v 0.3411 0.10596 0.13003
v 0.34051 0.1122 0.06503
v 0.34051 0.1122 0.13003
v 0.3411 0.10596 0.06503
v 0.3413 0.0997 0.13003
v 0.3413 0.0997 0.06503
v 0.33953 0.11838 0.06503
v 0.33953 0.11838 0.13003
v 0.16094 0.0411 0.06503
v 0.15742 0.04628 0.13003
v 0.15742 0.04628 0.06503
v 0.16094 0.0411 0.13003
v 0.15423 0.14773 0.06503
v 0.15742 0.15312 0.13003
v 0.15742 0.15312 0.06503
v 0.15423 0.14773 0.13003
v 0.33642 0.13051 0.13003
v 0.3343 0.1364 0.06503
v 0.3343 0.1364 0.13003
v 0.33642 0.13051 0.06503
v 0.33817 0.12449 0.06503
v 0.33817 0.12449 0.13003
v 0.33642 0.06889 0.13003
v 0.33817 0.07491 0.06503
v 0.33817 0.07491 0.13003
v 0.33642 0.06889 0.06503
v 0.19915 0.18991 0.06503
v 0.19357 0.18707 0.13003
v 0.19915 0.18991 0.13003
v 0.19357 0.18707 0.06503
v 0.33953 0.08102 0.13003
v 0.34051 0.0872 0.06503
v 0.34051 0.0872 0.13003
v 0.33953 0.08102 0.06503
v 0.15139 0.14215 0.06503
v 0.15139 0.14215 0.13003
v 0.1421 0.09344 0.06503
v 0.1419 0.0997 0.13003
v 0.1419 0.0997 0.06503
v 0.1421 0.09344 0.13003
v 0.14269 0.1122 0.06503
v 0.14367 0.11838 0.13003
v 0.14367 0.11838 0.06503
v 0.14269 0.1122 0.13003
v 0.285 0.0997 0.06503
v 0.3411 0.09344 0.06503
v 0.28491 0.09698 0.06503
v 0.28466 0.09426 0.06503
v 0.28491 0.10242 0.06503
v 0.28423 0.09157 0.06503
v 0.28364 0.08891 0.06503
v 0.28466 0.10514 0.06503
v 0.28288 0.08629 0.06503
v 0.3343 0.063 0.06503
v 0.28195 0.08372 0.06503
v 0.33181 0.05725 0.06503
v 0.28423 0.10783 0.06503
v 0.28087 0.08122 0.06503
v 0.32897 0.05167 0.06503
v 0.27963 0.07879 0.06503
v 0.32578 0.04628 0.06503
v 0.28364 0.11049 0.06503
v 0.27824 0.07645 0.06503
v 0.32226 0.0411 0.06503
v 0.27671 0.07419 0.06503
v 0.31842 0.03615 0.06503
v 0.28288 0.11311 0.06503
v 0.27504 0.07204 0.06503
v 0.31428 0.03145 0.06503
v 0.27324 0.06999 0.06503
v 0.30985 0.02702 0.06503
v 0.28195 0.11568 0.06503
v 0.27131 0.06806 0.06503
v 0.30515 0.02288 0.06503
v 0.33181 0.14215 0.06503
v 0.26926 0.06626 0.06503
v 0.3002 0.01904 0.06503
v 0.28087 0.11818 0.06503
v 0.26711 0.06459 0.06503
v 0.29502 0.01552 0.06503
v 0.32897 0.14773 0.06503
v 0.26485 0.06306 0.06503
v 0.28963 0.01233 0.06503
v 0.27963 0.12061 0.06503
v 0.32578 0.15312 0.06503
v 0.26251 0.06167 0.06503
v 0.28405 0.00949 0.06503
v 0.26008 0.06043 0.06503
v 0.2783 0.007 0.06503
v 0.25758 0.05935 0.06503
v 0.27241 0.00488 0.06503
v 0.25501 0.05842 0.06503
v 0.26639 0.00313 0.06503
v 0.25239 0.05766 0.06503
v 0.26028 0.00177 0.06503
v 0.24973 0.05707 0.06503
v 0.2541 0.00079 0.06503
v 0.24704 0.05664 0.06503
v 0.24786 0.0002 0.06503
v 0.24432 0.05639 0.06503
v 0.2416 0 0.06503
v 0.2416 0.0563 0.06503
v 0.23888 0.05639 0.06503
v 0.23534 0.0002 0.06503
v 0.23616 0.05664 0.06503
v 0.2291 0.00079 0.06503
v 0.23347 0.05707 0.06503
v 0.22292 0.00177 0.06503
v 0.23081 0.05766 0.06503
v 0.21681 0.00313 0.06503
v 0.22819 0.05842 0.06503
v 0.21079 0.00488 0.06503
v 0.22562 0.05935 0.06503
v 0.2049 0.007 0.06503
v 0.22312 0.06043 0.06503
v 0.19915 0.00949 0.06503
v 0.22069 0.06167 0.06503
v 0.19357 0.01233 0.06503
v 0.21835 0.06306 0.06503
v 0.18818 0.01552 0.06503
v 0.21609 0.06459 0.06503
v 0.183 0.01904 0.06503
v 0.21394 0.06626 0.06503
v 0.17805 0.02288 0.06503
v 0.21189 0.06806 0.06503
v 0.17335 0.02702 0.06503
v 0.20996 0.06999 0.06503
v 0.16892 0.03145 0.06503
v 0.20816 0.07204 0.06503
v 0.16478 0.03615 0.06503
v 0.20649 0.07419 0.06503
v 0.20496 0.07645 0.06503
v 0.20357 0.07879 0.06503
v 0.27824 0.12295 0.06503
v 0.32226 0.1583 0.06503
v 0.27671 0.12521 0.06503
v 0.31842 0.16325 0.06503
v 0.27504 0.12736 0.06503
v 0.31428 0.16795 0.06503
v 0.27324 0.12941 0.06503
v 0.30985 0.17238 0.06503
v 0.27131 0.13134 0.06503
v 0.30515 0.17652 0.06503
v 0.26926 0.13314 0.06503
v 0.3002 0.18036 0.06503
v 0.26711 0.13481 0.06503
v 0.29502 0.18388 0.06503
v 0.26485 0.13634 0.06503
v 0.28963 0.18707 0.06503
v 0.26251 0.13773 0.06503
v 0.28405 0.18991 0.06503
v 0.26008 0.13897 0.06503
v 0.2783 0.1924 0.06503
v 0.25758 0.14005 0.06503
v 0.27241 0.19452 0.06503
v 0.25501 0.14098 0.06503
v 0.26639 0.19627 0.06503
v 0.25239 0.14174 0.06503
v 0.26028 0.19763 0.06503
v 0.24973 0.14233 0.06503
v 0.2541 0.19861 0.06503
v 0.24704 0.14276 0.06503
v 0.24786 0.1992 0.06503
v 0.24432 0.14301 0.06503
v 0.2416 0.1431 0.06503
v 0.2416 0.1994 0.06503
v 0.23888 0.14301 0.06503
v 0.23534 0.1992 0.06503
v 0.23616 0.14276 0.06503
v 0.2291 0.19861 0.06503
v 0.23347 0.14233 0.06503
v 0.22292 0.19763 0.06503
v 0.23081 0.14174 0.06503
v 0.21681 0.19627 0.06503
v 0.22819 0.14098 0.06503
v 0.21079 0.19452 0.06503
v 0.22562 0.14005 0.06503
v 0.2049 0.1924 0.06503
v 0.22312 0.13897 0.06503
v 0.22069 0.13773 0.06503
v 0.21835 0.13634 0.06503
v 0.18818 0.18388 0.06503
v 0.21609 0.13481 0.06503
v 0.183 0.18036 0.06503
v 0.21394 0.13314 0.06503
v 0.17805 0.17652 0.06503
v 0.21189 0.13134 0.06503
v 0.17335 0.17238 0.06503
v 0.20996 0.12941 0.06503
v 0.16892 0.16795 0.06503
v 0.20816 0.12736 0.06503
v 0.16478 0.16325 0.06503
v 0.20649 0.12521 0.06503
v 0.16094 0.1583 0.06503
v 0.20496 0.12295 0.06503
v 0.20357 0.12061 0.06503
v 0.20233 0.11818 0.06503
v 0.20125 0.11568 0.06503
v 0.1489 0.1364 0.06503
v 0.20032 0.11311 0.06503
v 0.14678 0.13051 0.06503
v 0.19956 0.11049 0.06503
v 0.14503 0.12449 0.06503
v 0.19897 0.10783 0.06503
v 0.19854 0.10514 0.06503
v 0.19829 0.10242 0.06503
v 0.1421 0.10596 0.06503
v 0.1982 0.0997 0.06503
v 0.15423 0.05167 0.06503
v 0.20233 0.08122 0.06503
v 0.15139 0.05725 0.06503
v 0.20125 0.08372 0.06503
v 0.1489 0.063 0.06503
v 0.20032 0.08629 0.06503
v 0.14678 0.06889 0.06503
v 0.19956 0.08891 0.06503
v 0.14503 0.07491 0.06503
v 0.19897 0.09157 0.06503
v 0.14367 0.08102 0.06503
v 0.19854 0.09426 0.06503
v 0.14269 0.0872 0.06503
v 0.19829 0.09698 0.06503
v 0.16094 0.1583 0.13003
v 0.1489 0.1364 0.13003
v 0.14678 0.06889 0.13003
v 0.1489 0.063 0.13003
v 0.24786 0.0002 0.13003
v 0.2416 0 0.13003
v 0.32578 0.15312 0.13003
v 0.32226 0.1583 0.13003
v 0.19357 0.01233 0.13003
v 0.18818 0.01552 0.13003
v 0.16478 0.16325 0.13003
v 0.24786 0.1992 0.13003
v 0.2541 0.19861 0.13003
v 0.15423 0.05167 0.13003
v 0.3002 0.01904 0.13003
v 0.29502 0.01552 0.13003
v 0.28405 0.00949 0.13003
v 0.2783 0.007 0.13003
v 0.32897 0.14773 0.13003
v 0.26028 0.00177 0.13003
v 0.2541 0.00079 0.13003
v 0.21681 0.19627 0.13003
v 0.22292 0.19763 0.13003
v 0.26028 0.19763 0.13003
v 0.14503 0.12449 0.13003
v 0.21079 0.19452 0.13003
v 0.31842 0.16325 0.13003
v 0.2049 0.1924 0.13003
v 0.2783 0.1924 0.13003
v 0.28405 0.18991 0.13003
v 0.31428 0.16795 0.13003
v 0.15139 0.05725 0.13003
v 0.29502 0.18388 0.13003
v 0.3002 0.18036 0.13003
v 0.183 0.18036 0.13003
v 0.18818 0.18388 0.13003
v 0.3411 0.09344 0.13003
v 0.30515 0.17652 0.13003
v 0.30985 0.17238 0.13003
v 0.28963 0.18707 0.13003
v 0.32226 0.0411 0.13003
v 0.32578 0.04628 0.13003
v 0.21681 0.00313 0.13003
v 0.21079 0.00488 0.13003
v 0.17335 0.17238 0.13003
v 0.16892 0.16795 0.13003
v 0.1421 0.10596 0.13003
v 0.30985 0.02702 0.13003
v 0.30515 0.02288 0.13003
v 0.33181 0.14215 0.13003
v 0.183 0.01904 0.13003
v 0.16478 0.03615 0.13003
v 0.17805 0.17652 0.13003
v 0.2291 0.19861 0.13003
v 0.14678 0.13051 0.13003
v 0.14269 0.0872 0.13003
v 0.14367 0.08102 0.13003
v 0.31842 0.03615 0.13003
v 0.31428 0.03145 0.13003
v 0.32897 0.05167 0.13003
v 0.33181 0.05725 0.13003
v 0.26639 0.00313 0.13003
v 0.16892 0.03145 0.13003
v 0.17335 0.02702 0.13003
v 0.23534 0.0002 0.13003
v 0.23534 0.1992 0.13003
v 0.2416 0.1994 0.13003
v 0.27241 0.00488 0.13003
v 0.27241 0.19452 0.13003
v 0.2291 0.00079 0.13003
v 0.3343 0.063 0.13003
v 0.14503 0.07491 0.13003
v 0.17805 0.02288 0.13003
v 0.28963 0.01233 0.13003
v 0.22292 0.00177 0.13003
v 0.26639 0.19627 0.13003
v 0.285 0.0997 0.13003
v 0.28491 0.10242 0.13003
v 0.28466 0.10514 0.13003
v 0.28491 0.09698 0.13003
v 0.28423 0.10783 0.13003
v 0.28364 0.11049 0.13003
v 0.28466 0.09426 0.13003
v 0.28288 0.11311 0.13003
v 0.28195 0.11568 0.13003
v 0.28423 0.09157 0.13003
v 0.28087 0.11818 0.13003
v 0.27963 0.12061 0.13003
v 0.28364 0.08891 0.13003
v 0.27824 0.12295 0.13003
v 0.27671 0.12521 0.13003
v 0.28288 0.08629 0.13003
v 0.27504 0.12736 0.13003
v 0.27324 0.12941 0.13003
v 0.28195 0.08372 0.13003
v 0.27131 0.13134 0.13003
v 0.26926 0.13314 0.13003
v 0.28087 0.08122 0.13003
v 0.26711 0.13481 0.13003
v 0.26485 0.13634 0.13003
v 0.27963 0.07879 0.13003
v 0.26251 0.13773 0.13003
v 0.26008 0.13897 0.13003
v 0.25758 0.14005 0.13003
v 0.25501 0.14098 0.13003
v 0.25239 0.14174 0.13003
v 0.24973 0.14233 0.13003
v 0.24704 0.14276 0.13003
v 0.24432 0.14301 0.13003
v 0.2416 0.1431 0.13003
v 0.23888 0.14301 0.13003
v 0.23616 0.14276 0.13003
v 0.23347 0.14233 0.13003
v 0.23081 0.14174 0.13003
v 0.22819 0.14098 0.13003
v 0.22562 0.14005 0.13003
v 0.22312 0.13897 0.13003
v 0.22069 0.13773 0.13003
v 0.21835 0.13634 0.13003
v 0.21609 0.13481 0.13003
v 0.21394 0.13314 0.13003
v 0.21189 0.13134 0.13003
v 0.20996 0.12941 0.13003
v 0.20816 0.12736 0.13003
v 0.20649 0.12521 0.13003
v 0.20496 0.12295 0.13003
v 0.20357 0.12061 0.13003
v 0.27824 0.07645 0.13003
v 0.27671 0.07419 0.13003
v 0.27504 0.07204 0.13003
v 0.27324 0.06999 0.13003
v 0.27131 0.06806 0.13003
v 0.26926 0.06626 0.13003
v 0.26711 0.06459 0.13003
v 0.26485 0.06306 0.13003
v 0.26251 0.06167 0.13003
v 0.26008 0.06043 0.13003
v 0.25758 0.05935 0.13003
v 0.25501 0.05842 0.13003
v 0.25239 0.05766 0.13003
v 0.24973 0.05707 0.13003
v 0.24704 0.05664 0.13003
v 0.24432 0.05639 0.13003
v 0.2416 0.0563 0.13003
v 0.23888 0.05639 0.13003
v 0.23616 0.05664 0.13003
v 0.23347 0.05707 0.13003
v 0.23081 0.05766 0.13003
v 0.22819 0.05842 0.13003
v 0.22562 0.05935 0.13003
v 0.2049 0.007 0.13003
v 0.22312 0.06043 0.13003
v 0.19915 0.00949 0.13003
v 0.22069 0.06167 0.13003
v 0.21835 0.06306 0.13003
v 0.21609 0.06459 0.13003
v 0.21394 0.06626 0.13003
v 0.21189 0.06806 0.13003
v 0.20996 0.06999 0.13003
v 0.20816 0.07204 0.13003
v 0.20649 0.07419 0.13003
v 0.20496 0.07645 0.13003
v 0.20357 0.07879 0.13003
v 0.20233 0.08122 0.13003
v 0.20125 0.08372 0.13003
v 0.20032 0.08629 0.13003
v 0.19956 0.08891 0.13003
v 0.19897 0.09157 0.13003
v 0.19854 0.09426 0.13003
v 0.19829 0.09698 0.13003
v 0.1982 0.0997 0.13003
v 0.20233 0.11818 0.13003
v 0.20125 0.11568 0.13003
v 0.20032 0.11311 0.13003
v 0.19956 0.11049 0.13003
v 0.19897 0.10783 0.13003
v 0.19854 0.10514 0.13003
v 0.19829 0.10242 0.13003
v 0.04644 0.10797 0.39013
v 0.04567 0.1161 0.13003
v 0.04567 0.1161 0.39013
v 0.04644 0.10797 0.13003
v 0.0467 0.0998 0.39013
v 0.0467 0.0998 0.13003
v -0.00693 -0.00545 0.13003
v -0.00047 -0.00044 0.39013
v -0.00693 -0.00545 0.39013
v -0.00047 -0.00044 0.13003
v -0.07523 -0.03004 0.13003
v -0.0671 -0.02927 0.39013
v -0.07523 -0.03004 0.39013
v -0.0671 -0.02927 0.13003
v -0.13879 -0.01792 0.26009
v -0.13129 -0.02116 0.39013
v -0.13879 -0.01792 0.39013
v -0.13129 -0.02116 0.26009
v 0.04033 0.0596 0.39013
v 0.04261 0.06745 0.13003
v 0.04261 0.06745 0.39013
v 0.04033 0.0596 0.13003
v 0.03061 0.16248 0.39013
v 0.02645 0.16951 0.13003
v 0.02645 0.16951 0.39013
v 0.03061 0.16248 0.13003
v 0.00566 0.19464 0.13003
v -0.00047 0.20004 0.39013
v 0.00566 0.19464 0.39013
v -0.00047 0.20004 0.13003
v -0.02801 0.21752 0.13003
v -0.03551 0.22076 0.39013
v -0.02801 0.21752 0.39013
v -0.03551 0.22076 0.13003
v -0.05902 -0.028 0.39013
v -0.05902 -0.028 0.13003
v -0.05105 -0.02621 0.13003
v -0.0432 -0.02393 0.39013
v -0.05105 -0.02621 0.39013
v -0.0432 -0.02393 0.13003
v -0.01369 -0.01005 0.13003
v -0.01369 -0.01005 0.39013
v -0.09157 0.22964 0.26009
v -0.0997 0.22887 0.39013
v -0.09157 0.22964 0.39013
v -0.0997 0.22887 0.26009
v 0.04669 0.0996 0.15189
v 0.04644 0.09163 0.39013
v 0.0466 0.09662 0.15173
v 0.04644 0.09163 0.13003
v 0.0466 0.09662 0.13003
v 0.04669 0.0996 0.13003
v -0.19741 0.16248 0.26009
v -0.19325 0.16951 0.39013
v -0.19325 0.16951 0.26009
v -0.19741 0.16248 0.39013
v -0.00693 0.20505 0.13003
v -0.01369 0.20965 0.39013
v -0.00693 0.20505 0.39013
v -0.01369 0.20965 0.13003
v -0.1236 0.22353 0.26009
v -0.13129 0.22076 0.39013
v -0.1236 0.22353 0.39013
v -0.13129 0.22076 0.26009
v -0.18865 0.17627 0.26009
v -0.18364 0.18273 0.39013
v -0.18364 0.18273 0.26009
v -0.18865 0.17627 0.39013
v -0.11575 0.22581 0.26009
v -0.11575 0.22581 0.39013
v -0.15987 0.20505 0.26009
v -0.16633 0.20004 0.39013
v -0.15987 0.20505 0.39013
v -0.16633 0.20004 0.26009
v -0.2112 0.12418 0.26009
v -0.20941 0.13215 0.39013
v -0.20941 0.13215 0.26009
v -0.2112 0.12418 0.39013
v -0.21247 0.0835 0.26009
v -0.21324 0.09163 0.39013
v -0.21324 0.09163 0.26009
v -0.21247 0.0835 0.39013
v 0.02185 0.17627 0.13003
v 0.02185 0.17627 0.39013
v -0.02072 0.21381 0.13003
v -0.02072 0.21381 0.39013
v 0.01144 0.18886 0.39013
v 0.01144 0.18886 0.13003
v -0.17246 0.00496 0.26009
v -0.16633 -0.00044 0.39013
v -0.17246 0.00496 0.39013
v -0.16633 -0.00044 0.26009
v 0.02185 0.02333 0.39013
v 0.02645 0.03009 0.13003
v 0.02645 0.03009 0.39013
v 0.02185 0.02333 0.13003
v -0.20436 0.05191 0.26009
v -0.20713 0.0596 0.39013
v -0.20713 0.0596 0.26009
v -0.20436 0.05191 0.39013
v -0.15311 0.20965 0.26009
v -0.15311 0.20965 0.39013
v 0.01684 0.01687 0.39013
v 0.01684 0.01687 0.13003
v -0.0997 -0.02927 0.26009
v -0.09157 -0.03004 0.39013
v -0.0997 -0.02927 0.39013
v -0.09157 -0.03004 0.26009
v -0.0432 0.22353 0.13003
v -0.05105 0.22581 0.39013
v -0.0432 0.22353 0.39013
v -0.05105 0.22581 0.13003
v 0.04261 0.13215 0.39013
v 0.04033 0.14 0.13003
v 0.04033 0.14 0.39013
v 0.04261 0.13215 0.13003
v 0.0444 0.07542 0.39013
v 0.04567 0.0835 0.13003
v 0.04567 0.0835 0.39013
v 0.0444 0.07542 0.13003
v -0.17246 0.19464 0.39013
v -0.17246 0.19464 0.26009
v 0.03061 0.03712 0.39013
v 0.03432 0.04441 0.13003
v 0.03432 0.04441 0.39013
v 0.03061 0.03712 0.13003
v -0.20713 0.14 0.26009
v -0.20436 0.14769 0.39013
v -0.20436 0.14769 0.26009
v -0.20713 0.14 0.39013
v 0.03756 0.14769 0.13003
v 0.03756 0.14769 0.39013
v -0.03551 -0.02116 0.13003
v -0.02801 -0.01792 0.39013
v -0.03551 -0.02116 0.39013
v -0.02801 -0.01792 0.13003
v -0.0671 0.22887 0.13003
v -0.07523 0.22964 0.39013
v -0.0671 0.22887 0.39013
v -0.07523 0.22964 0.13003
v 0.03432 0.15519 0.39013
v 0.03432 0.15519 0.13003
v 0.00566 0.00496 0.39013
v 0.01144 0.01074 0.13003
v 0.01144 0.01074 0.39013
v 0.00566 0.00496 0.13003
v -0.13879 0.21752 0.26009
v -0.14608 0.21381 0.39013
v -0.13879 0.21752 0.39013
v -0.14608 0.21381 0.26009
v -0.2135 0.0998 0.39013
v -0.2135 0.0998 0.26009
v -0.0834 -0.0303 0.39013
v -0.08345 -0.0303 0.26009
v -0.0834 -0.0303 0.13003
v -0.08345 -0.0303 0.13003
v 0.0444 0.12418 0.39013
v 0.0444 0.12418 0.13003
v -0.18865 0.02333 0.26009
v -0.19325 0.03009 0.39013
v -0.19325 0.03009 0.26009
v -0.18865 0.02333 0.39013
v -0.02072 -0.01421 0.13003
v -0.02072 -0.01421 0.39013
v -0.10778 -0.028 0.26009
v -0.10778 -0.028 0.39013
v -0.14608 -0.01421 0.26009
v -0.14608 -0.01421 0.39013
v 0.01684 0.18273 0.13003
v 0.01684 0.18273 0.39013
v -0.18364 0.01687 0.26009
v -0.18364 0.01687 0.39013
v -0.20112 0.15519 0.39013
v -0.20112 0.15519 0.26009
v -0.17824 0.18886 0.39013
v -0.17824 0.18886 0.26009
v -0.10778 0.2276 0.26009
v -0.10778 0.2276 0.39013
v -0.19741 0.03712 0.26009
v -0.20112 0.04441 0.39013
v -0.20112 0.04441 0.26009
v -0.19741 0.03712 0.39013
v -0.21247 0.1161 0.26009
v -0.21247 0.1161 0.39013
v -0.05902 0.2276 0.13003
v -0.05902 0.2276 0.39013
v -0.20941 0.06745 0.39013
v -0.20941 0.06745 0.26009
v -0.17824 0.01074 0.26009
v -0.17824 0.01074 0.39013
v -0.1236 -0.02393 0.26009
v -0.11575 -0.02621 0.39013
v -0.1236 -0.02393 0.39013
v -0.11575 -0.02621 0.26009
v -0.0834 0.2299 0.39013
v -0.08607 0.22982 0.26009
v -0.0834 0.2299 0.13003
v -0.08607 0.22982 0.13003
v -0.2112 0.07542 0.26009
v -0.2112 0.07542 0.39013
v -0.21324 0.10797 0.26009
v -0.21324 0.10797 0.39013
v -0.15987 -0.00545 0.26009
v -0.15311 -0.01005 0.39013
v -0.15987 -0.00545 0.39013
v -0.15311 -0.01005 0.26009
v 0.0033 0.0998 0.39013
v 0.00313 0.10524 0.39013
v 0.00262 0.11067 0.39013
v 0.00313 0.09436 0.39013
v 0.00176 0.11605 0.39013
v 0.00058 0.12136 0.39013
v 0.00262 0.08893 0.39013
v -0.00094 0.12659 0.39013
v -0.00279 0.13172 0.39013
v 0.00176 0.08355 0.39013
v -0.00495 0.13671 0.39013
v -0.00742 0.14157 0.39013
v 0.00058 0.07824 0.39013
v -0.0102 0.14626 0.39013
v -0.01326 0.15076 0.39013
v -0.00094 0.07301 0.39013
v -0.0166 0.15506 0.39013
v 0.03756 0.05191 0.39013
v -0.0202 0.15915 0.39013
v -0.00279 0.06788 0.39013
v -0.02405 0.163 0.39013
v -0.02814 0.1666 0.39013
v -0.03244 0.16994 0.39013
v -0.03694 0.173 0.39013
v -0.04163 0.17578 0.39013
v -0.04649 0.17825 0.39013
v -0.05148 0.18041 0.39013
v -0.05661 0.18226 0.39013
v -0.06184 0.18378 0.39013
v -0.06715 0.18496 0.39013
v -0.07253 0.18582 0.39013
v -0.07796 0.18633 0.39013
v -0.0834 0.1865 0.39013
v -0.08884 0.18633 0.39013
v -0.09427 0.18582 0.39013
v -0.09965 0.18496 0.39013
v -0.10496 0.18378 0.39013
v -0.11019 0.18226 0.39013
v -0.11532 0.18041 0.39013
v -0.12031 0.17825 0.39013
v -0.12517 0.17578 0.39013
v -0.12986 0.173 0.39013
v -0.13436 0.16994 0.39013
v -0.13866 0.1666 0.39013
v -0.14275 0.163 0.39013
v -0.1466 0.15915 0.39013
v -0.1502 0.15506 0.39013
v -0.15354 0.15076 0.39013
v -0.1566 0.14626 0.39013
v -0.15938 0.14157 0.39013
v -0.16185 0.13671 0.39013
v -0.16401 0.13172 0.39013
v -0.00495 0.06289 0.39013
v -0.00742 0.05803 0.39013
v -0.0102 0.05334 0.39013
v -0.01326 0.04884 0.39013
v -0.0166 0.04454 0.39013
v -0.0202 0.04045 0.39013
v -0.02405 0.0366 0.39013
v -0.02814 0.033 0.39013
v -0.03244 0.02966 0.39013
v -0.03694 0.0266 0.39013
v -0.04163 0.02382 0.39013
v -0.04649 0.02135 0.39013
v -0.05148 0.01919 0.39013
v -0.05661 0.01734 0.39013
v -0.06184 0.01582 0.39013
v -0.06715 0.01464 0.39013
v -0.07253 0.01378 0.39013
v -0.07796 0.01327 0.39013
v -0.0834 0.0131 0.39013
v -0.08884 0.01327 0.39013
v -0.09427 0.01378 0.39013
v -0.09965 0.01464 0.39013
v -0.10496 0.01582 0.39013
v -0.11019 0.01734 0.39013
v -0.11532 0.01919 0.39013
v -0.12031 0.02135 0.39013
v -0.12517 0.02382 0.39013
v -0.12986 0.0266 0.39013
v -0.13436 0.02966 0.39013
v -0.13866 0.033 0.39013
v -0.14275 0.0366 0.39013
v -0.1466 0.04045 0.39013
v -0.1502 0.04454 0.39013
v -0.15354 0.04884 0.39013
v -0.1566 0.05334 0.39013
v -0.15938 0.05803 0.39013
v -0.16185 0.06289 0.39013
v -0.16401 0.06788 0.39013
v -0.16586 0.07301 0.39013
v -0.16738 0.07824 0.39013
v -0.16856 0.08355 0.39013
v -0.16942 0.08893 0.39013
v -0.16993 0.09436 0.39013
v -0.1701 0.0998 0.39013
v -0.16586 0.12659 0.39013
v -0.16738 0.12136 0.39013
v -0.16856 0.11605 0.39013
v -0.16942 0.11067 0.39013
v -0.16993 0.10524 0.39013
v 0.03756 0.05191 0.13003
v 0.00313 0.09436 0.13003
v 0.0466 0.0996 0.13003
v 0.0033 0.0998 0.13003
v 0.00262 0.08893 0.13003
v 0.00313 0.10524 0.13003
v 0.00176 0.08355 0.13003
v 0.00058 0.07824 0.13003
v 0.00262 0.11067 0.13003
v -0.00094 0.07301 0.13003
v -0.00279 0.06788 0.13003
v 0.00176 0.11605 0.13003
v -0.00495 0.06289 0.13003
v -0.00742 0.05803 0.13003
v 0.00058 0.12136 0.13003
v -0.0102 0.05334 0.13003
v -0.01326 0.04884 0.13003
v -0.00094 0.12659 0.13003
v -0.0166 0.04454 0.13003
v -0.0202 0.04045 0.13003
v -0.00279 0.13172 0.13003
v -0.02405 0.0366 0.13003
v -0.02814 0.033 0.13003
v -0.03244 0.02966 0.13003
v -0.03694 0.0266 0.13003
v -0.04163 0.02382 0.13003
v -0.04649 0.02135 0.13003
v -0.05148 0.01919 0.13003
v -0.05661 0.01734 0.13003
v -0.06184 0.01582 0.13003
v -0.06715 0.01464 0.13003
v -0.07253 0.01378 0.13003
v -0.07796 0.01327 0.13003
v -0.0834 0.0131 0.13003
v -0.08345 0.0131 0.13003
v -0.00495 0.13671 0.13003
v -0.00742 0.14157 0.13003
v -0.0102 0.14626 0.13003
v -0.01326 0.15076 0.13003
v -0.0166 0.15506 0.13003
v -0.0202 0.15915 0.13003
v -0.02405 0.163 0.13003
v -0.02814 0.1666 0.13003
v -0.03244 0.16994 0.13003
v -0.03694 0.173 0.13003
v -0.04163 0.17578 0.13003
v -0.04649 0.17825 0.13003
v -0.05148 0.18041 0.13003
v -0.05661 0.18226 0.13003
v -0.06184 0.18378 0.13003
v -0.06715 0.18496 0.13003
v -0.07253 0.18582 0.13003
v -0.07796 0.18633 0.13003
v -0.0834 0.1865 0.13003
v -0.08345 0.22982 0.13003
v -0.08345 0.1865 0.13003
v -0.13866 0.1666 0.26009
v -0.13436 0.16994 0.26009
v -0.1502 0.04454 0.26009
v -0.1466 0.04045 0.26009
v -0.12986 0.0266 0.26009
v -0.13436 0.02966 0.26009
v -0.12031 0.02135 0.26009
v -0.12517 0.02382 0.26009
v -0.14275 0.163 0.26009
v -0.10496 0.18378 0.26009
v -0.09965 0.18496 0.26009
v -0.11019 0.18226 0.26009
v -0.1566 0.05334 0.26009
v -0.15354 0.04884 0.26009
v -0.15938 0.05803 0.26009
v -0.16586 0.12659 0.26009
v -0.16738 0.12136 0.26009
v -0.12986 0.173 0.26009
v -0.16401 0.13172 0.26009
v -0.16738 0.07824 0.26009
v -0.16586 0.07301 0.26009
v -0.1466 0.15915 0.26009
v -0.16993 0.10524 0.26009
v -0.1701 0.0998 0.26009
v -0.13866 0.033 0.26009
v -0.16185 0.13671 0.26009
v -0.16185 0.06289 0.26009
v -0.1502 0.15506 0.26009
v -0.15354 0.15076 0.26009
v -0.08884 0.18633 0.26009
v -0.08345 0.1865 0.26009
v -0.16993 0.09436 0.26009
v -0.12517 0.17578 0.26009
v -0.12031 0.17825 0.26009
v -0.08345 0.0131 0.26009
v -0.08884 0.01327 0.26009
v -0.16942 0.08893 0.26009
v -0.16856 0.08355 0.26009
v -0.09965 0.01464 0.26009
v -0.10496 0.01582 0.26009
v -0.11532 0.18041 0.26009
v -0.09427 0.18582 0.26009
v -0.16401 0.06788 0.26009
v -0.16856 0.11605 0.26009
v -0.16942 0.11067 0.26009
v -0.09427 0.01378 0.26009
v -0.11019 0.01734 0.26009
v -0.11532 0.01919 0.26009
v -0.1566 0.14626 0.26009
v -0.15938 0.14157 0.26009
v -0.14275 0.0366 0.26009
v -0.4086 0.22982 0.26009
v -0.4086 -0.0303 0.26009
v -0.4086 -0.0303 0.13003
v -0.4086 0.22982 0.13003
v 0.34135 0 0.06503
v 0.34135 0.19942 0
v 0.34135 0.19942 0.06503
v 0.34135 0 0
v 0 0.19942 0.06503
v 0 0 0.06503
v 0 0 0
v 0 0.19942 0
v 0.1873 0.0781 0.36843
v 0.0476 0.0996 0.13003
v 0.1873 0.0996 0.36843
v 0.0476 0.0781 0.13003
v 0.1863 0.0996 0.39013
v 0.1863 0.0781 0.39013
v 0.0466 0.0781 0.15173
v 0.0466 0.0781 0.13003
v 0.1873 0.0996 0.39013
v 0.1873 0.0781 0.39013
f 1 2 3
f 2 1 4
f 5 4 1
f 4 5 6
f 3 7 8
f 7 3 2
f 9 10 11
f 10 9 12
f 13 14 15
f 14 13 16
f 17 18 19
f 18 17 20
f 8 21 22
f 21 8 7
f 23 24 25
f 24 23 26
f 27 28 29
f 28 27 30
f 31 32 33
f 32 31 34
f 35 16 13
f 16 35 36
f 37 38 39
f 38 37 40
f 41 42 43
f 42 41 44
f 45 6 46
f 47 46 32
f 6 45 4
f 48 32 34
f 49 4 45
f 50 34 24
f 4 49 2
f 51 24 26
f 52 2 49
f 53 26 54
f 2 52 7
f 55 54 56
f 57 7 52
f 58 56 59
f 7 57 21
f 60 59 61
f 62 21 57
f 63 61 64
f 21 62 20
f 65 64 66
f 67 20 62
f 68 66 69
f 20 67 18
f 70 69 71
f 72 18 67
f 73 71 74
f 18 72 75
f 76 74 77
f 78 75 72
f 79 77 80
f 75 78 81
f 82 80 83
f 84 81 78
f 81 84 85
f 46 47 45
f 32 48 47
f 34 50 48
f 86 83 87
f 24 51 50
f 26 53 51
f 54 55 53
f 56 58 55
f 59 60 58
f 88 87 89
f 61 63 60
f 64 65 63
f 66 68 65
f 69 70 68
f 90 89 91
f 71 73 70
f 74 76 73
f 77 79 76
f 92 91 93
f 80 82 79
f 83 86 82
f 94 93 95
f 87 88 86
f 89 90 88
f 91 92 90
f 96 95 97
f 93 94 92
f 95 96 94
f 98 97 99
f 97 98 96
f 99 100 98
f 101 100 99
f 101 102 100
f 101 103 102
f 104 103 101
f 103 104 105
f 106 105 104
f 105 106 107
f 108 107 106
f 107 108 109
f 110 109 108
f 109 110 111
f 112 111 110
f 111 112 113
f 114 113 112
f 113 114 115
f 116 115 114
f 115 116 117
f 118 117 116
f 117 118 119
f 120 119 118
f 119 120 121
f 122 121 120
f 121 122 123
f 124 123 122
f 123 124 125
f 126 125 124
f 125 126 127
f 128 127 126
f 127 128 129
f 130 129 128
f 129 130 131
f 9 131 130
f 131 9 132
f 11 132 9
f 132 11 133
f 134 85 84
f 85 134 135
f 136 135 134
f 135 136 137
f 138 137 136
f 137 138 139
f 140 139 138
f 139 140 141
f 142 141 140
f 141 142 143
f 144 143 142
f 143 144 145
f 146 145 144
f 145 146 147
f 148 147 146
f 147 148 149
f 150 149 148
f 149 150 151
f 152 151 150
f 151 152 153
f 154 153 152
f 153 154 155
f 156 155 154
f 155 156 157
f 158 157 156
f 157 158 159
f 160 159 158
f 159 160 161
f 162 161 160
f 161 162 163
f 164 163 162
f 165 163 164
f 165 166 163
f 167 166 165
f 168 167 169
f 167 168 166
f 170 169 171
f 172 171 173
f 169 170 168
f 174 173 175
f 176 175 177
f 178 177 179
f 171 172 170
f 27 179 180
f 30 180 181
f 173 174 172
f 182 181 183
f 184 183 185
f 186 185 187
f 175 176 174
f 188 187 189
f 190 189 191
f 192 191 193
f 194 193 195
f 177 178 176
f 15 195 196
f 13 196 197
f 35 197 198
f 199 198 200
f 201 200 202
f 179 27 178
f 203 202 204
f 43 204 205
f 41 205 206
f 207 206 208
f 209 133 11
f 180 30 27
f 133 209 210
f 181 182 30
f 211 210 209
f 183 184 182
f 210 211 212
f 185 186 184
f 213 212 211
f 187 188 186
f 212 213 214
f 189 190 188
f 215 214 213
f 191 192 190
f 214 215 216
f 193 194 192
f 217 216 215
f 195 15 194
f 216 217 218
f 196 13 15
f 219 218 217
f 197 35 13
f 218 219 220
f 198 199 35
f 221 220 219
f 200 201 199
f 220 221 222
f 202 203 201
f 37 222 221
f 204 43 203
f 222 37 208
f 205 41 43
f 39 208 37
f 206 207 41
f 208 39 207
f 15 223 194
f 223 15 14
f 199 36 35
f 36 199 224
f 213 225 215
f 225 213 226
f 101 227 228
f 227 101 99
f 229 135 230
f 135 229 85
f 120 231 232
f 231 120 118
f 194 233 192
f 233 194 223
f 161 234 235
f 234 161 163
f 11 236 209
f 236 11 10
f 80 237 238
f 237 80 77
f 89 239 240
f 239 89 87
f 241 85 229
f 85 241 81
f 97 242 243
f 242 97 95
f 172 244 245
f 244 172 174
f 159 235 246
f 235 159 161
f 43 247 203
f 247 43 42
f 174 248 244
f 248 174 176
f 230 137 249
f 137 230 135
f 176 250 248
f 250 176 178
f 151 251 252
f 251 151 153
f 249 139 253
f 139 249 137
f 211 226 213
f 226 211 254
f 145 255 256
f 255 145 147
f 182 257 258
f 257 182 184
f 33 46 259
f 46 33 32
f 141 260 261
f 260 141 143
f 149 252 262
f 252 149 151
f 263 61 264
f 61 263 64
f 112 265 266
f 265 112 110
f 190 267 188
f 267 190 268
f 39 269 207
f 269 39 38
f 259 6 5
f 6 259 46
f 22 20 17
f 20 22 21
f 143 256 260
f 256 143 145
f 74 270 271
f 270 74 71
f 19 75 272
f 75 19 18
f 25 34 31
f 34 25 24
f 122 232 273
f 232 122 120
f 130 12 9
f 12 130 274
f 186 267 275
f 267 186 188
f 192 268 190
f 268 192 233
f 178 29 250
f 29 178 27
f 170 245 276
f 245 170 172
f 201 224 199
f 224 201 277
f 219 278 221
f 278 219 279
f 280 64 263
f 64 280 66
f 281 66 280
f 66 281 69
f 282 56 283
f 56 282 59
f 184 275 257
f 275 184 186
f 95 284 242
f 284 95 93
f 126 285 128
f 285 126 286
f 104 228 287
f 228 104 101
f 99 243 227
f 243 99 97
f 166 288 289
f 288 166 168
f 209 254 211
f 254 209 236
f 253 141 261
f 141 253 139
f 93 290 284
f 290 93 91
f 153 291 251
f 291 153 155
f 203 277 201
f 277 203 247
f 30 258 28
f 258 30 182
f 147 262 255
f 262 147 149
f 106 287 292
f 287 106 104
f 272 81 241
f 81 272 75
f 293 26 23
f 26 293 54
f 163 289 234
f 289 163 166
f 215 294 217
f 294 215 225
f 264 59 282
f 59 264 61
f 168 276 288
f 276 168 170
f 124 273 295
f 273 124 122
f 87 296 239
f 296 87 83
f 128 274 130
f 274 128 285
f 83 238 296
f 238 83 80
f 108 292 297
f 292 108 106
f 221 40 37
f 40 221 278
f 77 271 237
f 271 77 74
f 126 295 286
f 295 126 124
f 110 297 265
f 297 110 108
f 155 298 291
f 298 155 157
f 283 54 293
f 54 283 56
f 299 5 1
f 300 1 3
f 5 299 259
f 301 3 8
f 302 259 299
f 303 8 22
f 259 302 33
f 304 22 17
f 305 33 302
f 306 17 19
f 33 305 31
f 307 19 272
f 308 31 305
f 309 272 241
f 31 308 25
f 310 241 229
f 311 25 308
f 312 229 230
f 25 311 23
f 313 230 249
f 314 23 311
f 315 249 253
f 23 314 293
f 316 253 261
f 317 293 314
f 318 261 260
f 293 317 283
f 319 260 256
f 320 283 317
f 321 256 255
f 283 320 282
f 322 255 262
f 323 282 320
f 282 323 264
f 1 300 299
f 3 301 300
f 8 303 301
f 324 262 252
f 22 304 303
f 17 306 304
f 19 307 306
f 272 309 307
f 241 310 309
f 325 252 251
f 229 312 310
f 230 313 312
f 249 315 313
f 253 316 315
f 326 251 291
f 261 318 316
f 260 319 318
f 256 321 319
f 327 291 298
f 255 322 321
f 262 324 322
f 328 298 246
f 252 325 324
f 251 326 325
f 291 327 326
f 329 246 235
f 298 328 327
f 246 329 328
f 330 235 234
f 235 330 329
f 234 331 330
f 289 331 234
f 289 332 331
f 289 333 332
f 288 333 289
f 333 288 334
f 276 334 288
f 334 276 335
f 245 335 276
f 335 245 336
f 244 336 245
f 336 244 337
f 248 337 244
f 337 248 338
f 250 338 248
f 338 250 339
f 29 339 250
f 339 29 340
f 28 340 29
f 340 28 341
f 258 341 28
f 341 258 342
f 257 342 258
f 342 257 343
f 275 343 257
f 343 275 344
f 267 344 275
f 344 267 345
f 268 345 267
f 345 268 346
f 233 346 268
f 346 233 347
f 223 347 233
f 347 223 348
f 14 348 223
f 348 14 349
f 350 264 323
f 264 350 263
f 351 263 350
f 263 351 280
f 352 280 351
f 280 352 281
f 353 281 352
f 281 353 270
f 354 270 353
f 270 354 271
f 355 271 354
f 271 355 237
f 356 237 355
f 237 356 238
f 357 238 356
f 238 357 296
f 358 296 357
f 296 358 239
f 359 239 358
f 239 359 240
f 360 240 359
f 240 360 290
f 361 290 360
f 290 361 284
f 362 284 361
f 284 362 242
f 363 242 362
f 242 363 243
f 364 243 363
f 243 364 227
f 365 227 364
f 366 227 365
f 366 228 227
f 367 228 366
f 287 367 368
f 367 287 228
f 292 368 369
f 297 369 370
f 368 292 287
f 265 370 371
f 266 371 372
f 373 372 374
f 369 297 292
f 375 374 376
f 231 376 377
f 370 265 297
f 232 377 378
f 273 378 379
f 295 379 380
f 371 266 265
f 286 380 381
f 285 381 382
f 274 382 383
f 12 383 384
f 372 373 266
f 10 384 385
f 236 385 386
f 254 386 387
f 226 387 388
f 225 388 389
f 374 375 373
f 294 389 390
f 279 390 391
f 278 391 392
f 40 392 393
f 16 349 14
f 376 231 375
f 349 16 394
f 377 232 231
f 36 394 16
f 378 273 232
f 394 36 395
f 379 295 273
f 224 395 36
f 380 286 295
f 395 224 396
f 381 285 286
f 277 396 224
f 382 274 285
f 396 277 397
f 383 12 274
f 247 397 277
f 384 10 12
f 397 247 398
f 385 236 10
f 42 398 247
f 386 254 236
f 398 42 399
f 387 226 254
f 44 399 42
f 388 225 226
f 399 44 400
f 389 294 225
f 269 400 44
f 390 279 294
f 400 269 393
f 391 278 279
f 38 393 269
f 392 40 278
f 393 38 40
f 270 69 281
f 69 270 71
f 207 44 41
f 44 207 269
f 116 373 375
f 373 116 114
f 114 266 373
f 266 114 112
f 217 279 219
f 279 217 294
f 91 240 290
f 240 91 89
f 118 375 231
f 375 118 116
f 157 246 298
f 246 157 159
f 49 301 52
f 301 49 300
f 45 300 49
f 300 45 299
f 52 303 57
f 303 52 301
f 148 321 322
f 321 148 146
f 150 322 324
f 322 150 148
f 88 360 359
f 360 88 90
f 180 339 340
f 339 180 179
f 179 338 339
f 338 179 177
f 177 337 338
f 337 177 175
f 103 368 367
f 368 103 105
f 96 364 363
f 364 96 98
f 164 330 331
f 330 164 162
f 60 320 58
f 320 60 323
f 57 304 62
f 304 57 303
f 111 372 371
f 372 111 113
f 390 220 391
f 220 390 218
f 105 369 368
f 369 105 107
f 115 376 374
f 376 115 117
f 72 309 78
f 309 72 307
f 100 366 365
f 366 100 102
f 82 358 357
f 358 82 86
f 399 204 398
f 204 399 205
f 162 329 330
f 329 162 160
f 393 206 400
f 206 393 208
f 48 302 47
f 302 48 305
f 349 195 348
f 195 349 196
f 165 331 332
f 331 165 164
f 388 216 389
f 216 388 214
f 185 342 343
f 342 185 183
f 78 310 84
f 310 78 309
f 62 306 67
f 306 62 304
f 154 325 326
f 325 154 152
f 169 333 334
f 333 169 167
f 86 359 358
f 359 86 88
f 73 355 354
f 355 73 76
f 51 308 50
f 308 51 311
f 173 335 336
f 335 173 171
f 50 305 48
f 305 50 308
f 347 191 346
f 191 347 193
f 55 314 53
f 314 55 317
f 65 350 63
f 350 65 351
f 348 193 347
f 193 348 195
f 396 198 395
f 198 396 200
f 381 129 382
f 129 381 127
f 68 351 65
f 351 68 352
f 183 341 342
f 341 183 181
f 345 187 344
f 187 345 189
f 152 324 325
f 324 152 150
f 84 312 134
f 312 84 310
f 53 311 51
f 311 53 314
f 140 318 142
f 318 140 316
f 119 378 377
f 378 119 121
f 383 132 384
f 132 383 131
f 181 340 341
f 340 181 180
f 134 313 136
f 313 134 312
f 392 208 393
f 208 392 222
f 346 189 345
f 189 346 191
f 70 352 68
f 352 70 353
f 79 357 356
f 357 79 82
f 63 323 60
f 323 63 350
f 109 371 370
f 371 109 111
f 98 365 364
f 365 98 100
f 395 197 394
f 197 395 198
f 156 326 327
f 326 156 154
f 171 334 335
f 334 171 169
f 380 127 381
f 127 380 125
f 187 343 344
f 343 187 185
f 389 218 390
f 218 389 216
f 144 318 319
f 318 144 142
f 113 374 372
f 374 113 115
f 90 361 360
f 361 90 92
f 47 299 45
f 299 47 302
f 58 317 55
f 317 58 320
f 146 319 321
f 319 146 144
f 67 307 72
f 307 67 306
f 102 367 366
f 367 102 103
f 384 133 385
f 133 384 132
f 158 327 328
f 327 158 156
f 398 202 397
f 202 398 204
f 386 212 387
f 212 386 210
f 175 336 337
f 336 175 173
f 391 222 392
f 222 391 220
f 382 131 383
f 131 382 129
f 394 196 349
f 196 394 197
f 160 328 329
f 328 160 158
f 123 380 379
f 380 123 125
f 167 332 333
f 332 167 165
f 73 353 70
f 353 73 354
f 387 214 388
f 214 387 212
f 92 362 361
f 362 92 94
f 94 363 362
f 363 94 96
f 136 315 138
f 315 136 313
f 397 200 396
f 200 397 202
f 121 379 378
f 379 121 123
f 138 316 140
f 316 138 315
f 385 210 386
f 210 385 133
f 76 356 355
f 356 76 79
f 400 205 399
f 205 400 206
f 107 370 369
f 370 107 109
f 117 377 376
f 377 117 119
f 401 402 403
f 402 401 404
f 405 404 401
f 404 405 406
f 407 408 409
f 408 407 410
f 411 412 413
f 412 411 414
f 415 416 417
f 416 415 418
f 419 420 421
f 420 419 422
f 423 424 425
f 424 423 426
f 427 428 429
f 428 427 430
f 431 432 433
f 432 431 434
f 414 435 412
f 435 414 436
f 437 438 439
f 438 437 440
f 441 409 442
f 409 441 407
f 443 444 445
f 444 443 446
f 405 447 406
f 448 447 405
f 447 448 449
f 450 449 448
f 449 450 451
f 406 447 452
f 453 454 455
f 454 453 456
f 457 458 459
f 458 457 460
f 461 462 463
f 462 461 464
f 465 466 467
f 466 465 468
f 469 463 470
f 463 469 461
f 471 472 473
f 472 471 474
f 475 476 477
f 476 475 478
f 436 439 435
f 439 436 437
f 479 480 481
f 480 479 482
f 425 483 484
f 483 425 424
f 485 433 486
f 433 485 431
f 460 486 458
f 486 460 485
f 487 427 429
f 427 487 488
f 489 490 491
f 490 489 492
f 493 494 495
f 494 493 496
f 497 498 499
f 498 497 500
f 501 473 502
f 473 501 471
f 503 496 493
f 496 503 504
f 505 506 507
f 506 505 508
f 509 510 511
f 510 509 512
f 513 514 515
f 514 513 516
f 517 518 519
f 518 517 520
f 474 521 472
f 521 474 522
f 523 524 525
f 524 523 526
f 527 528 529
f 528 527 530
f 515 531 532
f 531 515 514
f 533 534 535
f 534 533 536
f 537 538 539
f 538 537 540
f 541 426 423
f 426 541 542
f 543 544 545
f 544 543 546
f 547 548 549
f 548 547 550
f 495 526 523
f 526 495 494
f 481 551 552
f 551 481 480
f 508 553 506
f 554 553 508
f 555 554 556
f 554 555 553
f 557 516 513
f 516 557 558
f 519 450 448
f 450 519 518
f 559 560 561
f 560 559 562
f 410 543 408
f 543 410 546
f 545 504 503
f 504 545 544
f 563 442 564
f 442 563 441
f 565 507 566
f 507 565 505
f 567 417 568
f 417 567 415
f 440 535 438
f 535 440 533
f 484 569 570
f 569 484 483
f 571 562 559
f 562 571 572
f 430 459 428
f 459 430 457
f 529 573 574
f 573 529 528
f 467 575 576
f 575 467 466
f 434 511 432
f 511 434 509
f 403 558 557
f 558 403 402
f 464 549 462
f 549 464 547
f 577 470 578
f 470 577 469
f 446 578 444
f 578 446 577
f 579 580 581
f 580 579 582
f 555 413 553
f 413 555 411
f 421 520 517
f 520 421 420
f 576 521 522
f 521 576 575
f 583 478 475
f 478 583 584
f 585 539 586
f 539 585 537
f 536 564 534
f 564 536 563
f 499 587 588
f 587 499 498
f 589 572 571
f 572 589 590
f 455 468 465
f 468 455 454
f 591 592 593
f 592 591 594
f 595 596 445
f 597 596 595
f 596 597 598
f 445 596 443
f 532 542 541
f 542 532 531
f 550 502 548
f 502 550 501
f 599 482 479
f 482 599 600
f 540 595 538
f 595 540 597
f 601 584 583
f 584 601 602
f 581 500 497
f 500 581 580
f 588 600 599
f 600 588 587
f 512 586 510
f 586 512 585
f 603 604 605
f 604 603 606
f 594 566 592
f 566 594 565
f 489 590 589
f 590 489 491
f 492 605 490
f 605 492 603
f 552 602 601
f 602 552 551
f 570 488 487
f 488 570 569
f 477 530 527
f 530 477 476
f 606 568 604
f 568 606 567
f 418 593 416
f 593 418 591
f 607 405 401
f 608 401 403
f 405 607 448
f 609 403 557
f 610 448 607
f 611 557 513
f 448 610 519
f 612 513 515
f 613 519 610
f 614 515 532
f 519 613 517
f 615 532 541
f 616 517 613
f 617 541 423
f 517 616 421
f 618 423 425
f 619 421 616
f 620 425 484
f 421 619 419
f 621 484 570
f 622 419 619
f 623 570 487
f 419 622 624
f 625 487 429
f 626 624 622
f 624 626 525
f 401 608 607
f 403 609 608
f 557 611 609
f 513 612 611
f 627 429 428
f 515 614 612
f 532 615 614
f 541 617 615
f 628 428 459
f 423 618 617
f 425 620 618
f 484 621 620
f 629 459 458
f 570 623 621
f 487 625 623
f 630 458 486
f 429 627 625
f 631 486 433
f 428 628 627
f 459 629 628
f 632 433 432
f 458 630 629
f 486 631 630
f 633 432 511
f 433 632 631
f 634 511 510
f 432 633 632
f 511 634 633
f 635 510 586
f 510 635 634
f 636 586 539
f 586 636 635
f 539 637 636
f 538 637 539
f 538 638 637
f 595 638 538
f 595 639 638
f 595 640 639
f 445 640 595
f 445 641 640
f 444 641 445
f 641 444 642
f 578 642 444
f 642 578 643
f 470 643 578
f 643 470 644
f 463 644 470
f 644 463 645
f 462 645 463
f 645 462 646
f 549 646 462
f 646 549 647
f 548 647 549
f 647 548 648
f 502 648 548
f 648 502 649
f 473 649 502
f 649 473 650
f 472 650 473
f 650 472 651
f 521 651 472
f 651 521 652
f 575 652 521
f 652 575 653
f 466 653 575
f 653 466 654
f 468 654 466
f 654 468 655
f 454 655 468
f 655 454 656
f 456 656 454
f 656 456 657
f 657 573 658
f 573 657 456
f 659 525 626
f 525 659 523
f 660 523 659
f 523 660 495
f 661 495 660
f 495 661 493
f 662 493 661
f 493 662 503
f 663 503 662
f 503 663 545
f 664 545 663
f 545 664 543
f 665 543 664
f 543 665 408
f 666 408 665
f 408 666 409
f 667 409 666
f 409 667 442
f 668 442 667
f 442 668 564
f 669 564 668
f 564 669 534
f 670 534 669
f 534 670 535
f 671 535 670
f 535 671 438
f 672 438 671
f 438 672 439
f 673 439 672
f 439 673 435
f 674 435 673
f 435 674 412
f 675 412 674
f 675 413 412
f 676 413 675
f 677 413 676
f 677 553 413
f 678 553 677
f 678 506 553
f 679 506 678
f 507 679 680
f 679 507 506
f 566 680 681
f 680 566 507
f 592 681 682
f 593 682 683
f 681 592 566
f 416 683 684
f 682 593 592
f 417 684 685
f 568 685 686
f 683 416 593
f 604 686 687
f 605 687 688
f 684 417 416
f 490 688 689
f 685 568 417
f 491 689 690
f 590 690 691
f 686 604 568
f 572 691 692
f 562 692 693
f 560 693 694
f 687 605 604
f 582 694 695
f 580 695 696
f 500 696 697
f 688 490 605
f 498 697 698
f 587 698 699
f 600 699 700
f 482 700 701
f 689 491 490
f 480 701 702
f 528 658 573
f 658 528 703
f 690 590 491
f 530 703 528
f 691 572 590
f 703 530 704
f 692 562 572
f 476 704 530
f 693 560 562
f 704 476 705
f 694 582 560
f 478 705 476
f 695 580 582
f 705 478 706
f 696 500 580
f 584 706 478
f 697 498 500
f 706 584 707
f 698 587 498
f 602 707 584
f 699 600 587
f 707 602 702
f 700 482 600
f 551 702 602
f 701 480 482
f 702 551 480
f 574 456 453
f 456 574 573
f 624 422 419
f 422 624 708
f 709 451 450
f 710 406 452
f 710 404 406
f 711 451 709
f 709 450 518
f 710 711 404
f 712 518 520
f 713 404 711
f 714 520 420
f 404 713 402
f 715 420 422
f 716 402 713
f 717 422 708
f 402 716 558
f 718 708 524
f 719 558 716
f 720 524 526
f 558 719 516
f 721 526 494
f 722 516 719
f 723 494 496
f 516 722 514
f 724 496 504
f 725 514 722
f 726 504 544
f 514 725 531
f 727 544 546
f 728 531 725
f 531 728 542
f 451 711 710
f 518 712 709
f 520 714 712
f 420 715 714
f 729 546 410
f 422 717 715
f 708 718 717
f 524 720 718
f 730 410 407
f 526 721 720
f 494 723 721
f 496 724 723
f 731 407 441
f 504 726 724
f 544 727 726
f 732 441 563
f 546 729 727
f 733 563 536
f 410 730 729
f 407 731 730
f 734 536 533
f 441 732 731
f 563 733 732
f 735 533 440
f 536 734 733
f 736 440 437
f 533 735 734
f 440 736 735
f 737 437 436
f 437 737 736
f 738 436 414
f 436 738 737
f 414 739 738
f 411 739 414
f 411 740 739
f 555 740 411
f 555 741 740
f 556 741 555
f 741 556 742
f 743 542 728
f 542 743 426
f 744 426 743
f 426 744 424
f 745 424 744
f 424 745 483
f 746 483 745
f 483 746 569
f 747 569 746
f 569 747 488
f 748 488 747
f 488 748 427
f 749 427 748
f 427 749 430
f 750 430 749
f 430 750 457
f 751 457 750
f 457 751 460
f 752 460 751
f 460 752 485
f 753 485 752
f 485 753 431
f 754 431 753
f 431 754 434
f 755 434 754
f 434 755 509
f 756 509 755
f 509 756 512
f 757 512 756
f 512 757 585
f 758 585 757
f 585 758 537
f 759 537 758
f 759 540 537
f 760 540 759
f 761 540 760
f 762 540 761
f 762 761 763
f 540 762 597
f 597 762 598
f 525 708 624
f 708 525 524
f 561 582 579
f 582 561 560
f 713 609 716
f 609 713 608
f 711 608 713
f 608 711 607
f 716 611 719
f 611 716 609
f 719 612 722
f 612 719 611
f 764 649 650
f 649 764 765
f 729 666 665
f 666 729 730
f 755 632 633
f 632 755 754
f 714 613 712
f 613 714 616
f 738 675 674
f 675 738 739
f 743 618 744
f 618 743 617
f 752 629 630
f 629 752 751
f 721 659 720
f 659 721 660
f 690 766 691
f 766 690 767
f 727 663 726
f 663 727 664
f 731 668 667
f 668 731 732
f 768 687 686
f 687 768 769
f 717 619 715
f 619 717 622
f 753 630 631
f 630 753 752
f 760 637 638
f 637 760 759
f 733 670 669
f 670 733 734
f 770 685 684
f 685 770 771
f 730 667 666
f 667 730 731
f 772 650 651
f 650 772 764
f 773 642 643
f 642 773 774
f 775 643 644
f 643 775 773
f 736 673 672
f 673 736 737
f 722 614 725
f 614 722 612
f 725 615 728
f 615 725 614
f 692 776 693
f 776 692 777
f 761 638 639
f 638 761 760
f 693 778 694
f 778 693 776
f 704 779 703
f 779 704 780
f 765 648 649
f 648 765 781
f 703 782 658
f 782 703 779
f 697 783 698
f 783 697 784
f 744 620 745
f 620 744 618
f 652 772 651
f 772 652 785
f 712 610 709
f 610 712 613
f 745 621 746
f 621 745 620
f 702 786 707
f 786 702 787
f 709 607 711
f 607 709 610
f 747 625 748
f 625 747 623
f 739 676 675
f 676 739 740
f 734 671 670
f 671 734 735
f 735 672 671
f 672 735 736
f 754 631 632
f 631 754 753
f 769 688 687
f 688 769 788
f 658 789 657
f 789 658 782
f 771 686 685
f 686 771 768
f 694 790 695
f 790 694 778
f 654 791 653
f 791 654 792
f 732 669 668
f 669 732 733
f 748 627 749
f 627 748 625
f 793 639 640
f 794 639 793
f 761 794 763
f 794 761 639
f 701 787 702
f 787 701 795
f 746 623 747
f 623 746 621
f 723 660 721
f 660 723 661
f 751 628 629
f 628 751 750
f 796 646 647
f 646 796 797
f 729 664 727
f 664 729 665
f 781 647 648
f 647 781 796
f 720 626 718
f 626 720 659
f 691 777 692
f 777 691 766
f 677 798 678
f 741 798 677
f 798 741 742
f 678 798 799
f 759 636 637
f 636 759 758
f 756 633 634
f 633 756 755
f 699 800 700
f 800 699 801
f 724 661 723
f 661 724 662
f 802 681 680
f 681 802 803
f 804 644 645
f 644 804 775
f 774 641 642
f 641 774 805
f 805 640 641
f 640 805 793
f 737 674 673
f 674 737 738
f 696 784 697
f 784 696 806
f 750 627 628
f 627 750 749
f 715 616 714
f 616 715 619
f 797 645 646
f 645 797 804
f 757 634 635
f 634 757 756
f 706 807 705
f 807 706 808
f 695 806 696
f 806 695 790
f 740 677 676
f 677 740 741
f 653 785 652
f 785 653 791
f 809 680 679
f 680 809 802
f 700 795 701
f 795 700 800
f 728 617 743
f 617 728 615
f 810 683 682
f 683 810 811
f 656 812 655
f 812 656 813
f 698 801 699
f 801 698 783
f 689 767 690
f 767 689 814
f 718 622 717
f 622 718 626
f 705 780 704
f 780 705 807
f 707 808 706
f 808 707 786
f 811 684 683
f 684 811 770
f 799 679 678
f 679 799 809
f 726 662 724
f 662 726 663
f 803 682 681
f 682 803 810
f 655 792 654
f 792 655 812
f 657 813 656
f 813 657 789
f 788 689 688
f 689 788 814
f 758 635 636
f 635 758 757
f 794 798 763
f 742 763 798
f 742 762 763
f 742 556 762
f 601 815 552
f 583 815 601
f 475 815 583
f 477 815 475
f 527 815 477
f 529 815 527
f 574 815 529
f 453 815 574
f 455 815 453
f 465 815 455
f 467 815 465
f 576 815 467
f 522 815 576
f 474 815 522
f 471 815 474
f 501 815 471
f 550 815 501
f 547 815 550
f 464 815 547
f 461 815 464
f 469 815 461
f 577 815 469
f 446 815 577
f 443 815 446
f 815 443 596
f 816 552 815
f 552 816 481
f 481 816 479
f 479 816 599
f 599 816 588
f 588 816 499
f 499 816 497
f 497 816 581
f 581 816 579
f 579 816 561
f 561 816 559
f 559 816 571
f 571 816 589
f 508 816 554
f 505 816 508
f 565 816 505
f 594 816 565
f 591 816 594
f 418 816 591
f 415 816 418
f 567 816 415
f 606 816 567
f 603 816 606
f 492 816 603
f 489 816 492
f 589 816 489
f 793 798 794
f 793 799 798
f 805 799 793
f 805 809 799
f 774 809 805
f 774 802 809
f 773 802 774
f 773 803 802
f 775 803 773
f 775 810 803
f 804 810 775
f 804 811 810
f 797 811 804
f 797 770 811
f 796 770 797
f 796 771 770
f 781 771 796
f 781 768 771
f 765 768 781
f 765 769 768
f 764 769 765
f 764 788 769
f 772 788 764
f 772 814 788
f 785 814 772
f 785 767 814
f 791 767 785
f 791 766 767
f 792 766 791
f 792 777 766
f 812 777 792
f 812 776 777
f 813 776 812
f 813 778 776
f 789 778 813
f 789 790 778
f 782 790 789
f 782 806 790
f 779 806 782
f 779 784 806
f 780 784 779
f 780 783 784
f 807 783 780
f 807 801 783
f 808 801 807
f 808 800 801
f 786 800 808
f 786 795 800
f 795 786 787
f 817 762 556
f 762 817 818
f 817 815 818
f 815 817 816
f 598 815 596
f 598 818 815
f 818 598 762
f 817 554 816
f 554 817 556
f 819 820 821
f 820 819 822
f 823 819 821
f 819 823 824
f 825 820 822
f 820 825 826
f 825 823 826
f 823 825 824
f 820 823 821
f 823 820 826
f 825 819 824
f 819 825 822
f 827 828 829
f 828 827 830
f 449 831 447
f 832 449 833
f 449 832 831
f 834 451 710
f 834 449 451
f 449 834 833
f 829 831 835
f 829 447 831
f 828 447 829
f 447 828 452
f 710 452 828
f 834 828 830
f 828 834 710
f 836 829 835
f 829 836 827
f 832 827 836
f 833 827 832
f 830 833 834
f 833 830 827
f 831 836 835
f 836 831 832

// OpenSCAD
// Parameters
base_length = 0.341352;
base_width = 0.199422;
base_height = 0.065029;
main_extrusion = 0.065;

// Annular section parameters
annular_center_left = 0.2416;
annular_center_front = 0.0997;
annular_outer_r = 0.0997;
annular_inner_r = 0.0434;

// Hollow sleeve parameters
sleeve_span = 0.2602;
sleeve_offset_left = -0.2135;
sleeve_offset_right = 0.2946;
sleeve_offset_front = -0.0303;
sleeve_offset_back = -0.0305;
sleeve_center_left = -0.0834;
sleeve_center_front = 0.0998;
sleeve_outer_r = 0.1301;
sleeve_inner_r = 0.0867;
sleeve_height = 0.2601;

// Arm parameters
arm_length = 0.325145;
arm_width = 0.260116;
arm_height = 0.130058;
arm_offset_left = -0.4086;
arm_offset_right = 0.4248;
arm_offset_front = -0.0303;
arm_offset_back = -0.0304;
arm_cut_range = 0.065;

// Triangular web parameters
web_run = 0.108382;
web_thickness = 0.0217;
web_left_min = 0.0466;
web_left_max = 0.1863;
web_front_offset = 0.0781;
web_back_offset = 0.0996;
web_rise_span = 0.195087;
web_max_height = 0.2601;

$fn = 100;

// Main base
module base() {
    cube([base_length, base_width, base_height]);
}

// Low rounded annular section
module annular_section() {
    translate([annular_center_left, annular_center_front, base_height]) {
        difference() {
            cylinder(h = main_extrusion, r = annular_outer_r);
            cylinder(h = main_extrusion + 0.001, r = annular_inner_r);
        }
    }
}

// Taller hollow sleeve
module hollow_sleeve() {
    sleeve_x = sleeve_center_left;
    sleeve_y = sleeve_center_front;
    sleeve_base_z = base_height + main_extrusion;
    
    translate([sleeve_x, sleeve_y, sleeve_base_z]) {
        difference() {
            cylinder(h = sleeve_height, r = sleeve_outer_r);
            translate([0, 0, -0.001])
                cylinder(h = sleeve_height + 0.002, r = sleeve_inner_r);
        }
    }
}

// Arm with cutaway lower band
module arm_with_cut() {
    arm_x = arm_offset_left;
    arm_y = arm_offset_front;
    arm_z = base_height + main_extrusion;
    
    difference() {
        translate([arm_x, arm_y, arm_z])
            cube([arm_length, arm_width, arm_height]);
        
        // Cut away lower band from underside
        translate([arm_x - 0.001, arm_y - 0.001, -0.001])
            cube([arm_length + 0.002, arm_width + 0.002, arm_cut_range + 0.001]);
    }
}

// Triangular web
module triangular_web() {
    web_x_start = web_left_min;
    web_x_end = web_left_max;
    web_y_front = web_front_offset;
    web_y_back = web_back_offset;
    web_base_z = base_height + main_extrusion;
    
    // Create triangular cross-section that rises toward sleeve
    hull() {
        // Bottom edge at start
        translate([web_x_start, web_y_front, web_base_z])
            cube([0.001, web_y_back - web_y_front, web_thickness]);
        
        // Top edge at end, rising toward sleeve height
        translate([web_x_end, web_y_front, web_base_z + web_max_height - web_thickness])
            cube([0.001, web_y_back - web_y_front, web_thickness]);
    }
}

// Final assembly
union() {
    base();
    annular_section();
    hollow_sleeve();
    arm_with_cut();
    triangular_web();
}
